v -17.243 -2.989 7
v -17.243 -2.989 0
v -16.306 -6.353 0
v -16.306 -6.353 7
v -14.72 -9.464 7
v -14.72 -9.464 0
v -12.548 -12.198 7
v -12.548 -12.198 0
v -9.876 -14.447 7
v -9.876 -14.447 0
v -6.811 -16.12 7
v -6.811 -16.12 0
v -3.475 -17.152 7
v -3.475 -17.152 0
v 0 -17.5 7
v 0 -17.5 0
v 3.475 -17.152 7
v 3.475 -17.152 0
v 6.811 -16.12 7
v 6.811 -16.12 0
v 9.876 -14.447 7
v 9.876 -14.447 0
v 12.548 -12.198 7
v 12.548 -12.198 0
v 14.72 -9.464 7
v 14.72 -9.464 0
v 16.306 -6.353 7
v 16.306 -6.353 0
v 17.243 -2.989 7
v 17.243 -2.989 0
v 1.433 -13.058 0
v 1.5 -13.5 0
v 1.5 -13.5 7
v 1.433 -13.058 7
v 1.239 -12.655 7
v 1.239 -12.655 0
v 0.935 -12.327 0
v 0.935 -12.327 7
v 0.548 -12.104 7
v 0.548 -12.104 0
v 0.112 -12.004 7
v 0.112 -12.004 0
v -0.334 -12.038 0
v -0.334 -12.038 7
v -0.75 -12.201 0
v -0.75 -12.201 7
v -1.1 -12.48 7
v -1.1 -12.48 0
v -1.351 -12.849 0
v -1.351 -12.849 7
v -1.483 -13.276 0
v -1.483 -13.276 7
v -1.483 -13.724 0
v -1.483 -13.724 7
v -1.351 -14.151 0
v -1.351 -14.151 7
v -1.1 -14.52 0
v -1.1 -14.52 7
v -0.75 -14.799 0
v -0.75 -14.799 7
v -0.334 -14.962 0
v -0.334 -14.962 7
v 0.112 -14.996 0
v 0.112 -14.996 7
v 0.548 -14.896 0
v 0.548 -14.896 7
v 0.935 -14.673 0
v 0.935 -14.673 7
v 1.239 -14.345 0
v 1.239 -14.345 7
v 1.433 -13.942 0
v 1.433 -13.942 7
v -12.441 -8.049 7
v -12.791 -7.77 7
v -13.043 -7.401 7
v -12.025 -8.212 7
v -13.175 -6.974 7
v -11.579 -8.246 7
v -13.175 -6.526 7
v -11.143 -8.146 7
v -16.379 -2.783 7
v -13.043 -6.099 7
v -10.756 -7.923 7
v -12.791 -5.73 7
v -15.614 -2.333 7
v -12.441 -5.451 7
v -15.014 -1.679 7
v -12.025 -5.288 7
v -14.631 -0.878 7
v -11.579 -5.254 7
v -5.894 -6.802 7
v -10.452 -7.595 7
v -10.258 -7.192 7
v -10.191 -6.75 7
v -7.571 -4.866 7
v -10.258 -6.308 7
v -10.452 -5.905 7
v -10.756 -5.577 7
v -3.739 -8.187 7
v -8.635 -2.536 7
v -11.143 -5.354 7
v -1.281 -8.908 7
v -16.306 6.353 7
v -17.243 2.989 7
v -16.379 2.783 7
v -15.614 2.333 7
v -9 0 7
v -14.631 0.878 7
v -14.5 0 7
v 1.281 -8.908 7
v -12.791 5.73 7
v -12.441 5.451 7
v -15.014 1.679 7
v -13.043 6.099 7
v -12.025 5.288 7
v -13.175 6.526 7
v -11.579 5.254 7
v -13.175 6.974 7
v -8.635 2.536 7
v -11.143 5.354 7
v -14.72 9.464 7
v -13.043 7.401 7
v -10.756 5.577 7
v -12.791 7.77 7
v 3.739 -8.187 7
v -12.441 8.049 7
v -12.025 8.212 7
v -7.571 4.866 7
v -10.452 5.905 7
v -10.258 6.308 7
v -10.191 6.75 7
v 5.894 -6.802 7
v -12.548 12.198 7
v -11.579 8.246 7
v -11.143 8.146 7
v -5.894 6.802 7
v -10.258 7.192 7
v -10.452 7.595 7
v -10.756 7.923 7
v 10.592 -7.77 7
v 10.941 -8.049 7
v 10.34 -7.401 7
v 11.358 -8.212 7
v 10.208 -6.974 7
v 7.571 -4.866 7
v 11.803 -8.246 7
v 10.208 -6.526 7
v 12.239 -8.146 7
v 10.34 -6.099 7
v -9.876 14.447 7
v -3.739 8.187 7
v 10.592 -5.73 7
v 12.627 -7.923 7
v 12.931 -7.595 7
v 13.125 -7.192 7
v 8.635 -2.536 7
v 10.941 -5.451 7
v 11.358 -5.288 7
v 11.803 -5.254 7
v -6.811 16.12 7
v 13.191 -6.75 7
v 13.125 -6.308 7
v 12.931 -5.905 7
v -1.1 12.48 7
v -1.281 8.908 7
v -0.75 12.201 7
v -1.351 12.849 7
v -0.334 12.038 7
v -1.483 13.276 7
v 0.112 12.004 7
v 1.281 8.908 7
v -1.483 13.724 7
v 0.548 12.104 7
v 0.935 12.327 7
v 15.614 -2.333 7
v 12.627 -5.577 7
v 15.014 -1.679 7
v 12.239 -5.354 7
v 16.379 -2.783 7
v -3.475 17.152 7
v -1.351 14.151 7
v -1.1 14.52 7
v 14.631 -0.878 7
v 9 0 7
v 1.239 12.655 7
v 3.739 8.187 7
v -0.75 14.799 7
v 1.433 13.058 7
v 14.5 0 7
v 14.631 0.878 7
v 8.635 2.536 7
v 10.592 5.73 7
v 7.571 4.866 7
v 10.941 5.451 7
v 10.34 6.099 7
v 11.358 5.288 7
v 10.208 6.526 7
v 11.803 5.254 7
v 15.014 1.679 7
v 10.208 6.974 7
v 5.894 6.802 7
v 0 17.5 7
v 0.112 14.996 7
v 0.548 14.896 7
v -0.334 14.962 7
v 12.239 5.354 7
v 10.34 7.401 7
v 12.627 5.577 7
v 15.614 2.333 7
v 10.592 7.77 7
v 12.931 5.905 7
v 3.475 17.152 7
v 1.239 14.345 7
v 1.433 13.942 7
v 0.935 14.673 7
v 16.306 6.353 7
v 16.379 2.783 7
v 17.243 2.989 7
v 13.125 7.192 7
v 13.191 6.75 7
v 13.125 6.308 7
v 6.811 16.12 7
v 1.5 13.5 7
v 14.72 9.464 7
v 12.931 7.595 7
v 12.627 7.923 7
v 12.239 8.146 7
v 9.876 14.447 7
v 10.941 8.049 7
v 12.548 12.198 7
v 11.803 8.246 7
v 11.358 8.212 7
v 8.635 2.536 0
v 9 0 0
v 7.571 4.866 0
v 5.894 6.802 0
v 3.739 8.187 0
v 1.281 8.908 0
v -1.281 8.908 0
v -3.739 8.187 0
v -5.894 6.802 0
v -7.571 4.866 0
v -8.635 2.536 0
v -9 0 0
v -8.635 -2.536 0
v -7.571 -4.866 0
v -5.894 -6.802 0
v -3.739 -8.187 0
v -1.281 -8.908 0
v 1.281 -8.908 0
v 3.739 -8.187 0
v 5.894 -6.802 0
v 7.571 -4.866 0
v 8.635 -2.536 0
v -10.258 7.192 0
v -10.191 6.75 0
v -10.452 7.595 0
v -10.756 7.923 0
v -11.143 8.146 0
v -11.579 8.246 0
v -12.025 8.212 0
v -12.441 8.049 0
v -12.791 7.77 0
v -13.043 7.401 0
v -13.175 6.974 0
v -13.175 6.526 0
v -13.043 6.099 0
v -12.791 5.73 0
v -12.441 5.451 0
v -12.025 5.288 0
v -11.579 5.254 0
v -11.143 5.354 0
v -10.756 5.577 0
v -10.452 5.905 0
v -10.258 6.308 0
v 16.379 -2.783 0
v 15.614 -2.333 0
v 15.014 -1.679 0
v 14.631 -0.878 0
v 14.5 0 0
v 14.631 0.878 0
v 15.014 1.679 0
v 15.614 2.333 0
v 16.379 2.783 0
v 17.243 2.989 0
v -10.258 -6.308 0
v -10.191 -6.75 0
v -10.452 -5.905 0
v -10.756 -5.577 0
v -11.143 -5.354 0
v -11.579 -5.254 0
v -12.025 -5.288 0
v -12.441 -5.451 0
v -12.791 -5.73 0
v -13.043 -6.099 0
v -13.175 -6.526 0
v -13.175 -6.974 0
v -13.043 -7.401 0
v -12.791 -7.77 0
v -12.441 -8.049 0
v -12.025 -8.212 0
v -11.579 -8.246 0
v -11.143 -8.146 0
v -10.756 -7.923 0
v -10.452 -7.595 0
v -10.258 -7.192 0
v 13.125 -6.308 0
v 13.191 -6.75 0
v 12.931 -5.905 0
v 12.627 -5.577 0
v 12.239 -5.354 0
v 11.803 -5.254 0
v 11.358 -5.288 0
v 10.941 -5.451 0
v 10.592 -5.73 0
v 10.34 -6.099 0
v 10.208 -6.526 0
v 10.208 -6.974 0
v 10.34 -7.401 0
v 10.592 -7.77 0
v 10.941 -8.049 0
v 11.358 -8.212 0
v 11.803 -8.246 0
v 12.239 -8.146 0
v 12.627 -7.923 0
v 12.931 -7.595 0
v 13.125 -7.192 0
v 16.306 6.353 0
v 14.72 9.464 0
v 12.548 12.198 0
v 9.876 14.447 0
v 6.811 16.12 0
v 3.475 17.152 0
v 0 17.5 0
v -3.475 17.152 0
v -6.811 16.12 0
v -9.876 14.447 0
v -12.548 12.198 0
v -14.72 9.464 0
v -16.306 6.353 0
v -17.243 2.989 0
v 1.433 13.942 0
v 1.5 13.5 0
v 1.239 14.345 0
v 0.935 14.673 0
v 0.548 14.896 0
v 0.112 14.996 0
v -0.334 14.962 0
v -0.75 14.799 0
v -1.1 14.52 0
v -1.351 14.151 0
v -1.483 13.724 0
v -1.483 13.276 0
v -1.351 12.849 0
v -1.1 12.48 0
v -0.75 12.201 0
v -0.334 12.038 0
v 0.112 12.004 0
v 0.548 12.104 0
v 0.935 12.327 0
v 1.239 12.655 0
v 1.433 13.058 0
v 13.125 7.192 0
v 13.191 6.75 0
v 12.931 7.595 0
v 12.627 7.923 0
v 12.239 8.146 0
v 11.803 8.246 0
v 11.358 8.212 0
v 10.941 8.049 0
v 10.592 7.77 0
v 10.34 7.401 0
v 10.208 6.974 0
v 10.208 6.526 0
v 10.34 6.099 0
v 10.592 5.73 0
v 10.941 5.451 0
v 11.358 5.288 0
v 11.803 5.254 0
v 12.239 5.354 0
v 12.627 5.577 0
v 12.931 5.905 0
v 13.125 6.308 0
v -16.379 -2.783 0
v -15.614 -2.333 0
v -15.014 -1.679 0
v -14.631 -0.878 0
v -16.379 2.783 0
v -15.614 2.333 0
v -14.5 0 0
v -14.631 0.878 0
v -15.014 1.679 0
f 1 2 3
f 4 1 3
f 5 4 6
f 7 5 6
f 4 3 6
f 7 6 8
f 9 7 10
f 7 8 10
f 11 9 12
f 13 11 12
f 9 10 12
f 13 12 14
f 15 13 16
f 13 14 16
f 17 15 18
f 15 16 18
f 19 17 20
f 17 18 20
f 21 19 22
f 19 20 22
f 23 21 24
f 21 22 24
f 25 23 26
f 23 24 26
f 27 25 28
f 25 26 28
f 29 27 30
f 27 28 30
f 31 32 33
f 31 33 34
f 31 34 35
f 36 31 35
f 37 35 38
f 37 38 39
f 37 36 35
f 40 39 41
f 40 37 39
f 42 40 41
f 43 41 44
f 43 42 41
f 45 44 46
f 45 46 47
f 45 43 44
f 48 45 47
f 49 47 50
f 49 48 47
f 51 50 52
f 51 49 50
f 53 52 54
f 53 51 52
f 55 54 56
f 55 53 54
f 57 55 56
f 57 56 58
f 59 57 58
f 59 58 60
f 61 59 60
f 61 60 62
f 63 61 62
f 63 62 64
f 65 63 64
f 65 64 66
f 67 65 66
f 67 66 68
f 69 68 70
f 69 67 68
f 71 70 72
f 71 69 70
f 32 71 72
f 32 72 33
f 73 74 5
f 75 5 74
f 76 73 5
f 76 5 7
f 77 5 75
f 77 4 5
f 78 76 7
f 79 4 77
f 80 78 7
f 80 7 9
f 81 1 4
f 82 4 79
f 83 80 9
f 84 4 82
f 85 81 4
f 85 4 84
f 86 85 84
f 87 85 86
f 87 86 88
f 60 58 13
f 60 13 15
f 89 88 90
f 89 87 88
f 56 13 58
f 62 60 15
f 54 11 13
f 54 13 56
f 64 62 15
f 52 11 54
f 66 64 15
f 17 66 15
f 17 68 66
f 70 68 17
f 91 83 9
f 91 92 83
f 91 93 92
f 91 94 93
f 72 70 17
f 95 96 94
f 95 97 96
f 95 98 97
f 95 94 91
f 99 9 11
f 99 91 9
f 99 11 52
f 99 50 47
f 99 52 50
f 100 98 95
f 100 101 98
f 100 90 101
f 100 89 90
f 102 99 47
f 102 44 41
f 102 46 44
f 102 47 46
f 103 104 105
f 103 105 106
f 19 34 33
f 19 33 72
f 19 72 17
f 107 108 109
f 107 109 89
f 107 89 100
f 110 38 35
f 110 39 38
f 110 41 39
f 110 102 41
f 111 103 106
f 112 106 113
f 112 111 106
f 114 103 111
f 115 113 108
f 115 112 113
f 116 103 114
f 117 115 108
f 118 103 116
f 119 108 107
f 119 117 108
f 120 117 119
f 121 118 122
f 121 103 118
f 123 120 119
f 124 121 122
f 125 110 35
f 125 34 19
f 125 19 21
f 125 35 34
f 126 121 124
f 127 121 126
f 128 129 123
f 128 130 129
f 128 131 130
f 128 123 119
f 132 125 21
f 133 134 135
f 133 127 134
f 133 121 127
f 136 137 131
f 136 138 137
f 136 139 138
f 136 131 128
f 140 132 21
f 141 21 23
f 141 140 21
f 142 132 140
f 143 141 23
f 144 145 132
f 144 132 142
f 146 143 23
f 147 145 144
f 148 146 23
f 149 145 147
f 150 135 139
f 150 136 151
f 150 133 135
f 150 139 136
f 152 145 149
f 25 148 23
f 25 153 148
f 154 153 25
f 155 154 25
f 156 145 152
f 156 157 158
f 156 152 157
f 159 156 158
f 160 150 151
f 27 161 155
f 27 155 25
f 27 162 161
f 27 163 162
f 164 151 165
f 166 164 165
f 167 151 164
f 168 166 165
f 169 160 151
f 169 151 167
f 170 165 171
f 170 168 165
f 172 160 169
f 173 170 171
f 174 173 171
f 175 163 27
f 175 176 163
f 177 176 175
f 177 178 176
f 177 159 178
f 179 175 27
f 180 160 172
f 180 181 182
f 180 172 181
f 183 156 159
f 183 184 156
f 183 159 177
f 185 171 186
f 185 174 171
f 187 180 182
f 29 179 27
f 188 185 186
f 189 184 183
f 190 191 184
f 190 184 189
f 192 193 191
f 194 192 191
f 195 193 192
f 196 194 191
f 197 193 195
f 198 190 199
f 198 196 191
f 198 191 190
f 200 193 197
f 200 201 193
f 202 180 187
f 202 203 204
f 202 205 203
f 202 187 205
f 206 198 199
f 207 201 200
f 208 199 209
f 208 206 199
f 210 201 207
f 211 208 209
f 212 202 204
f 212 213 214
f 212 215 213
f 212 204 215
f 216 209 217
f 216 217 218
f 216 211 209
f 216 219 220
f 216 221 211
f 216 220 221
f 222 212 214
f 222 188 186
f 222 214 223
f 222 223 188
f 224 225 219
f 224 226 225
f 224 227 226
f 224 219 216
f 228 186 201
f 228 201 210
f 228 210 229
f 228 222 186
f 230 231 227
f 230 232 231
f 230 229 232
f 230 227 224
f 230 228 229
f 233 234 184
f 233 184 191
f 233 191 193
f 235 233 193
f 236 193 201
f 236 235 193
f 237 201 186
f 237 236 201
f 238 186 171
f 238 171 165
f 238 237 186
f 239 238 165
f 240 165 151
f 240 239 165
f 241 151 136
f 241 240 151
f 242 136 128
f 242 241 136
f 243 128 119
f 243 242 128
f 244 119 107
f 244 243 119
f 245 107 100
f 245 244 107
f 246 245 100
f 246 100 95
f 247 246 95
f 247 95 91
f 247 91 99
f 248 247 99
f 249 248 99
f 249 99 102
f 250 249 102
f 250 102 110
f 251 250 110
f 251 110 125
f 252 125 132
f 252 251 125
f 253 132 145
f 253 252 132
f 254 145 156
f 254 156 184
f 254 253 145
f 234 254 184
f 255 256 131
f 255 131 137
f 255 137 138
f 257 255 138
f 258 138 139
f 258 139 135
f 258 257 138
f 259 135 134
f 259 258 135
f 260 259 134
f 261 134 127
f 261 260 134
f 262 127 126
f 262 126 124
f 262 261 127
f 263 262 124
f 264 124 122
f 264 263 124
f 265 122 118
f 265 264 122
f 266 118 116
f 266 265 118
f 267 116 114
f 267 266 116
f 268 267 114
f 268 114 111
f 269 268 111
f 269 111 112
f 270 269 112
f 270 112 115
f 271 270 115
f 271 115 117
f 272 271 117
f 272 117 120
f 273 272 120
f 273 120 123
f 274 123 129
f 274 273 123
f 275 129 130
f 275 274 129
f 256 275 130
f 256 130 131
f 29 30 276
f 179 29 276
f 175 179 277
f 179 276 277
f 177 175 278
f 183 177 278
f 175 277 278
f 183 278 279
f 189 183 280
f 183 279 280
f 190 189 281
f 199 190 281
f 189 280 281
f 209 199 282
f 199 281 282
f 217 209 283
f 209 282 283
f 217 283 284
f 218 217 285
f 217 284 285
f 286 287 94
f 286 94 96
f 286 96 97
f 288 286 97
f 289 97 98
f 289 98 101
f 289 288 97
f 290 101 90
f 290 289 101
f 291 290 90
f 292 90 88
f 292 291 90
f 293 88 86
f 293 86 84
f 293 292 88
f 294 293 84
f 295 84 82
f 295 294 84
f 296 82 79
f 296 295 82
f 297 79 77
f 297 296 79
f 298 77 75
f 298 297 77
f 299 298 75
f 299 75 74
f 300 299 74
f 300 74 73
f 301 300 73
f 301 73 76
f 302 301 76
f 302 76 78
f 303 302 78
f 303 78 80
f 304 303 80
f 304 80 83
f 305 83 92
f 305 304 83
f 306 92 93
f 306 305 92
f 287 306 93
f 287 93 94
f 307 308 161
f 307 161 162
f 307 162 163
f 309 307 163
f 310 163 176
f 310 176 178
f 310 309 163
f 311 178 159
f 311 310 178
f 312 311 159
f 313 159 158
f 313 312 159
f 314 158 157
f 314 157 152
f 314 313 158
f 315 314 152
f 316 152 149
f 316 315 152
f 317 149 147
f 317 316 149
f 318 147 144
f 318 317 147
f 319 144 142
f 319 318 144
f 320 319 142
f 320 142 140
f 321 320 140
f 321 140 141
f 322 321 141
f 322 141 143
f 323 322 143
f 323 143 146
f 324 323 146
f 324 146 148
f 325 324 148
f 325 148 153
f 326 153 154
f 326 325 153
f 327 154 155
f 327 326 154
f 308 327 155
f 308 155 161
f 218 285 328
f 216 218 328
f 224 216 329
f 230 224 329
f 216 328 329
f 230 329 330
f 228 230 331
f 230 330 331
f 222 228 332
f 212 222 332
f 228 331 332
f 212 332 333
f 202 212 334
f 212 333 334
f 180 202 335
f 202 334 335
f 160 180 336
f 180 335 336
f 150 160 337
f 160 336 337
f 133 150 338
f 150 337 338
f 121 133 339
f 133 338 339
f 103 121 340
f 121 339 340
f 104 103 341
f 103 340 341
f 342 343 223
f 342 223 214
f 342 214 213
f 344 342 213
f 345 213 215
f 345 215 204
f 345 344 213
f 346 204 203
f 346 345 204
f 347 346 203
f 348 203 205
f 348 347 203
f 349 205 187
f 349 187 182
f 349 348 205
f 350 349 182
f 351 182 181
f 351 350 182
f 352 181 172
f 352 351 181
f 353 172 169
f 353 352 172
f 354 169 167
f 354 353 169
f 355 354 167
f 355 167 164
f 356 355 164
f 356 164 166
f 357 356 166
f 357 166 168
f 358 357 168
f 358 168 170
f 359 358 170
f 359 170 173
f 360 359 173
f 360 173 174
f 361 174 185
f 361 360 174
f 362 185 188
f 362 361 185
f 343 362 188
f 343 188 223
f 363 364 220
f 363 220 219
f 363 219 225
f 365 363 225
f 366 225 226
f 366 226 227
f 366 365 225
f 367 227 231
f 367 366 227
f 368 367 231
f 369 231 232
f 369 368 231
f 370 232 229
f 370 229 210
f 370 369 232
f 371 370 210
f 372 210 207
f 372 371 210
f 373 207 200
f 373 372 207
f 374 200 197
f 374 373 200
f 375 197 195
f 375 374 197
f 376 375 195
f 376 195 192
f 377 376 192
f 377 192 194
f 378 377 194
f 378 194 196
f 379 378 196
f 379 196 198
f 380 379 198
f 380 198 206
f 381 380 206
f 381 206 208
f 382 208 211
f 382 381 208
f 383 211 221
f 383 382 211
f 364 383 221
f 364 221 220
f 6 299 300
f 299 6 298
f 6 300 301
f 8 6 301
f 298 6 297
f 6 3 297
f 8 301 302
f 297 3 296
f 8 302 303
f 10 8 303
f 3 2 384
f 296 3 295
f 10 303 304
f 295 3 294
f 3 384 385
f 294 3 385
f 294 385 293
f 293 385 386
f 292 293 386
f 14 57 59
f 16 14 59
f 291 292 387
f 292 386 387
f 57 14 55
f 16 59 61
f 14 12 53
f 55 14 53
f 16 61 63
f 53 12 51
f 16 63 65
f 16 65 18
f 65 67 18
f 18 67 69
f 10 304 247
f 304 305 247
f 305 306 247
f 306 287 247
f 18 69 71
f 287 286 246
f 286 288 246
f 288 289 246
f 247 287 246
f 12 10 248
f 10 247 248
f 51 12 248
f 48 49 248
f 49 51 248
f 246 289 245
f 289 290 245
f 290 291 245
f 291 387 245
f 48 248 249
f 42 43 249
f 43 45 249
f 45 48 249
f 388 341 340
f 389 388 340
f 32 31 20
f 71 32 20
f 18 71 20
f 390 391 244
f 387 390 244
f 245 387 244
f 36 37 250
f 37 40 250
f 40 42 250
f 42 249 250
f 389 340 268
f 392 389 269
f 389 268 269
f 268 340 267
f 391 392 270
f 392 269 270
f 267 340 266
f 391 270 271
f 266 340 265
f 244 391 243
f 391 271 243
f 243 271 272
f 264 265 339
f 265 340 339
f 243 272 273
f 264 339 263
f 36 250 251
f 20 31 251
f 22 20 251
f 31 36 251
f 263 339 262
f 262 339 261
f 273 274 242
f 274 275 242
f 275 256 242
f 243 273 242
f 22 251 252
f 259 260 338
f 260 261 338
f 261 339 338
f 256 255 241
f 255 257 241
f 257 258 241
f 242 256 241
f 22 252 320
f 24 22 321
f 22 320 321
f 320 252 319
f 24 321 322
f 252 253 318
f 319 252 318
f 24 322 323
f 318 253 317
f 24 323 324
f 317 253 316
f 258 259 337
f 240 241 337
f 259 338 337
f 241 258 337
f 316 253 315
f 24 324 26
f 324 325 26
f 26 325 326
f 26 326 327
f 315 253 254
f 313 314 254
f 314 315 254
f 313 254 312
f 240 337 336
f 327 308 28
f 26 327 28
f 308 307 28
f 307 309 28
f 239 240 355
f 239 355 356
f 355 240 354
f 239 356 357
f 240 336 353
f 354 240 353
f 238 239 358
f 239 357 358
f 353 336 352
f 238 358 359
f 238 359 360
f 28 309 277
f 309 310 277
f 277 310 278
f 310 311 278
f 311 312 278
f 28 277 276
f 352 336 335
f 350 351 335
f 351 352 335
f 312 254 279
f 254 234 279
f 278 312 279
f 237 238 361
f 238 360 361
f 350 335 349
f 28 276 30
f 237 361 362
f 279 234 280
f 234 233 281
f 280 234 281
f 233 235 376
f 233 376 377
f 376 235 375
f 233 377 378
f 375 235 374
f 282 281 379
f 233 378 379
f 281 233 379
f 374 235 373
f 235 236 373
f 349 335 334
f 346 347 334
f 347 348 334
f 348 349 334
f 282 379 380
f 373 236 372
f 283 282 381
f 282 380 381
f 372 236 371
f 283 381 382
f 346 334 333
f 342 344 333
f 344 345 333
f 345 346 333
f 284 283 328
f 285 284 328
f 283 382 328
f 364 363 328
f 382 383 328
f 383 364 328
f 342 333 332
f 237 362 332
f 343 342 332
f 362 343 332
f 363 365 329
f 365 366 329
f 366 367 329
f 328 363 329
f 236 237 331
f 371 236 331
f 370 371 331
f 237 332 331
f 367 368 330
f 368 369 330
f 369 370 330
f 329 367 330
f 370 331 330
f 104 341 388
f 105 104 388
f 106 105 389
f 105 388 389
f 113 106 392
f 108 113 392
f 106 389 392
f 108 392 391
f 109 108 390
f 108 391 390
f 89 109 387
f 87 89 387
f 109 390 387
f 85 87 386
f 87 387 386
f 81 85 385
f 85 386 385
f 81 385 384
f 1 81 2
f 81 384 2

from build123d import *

# Parameters (mm, degrees)
SKETCH_1_R      = 1.5
SKETCH_1_R_2    = 9
EXTRUDE_1_DEPTH = 7


with BuildPart() as part:
    # 草图1 → 凸台-拉伸1 (new body)
    with BuildSketch(Plane.XY):
        with BuildLine():
            ThreePointArc((17.242857143, -2.988959276), (14.5, 0), (17.242857143, 2.988959276))
            ThreePointArc((17.242857143, 2.988959276), (0, 17.5), (-17.242857143, 2.988959276))
            ThreePointArc((-17.242857143, 2.988959276), (-14.5, 0), (-17.242857143, -2.988959276))
            ThreePointArc((-17.242857143, -2.988959276), (0, -17.5), (17.242857143, -2.988959276))
        make_face()
        with Locations((-11.691342951, -6.75)):
            Circle(SKETCH_1_R, mode=Mode.SUBTRACT)
        with Locations((0, -13.5)):
            Circle(SKETCH_1_R, mode=Mode.SUBTRACT)
        with Locations((11.691342951, -6.75)):
            Circle(SKETCH_1_R, mode=Mode.SUBTRACT)
        with Locations((-11.691342951, 6.75)):
            Circle(SKETCH_1_R, mode=Mode.SUBTRACT)
        Circle(SKETCH_1_R_2, mode=Mode.SUBTRACT)
        with Locations((11.691342951, 6.75)):
            Circle(SKETCH_1_R, mode=Mode.SUBTRACT)
        with Locations((0, 13.5)):
            Circle(SKETCH_1_R, mode=Mode.SUBTRACT)
    extrude(amount=EXTRUDE_1_DEPTH)


solid = part.part
